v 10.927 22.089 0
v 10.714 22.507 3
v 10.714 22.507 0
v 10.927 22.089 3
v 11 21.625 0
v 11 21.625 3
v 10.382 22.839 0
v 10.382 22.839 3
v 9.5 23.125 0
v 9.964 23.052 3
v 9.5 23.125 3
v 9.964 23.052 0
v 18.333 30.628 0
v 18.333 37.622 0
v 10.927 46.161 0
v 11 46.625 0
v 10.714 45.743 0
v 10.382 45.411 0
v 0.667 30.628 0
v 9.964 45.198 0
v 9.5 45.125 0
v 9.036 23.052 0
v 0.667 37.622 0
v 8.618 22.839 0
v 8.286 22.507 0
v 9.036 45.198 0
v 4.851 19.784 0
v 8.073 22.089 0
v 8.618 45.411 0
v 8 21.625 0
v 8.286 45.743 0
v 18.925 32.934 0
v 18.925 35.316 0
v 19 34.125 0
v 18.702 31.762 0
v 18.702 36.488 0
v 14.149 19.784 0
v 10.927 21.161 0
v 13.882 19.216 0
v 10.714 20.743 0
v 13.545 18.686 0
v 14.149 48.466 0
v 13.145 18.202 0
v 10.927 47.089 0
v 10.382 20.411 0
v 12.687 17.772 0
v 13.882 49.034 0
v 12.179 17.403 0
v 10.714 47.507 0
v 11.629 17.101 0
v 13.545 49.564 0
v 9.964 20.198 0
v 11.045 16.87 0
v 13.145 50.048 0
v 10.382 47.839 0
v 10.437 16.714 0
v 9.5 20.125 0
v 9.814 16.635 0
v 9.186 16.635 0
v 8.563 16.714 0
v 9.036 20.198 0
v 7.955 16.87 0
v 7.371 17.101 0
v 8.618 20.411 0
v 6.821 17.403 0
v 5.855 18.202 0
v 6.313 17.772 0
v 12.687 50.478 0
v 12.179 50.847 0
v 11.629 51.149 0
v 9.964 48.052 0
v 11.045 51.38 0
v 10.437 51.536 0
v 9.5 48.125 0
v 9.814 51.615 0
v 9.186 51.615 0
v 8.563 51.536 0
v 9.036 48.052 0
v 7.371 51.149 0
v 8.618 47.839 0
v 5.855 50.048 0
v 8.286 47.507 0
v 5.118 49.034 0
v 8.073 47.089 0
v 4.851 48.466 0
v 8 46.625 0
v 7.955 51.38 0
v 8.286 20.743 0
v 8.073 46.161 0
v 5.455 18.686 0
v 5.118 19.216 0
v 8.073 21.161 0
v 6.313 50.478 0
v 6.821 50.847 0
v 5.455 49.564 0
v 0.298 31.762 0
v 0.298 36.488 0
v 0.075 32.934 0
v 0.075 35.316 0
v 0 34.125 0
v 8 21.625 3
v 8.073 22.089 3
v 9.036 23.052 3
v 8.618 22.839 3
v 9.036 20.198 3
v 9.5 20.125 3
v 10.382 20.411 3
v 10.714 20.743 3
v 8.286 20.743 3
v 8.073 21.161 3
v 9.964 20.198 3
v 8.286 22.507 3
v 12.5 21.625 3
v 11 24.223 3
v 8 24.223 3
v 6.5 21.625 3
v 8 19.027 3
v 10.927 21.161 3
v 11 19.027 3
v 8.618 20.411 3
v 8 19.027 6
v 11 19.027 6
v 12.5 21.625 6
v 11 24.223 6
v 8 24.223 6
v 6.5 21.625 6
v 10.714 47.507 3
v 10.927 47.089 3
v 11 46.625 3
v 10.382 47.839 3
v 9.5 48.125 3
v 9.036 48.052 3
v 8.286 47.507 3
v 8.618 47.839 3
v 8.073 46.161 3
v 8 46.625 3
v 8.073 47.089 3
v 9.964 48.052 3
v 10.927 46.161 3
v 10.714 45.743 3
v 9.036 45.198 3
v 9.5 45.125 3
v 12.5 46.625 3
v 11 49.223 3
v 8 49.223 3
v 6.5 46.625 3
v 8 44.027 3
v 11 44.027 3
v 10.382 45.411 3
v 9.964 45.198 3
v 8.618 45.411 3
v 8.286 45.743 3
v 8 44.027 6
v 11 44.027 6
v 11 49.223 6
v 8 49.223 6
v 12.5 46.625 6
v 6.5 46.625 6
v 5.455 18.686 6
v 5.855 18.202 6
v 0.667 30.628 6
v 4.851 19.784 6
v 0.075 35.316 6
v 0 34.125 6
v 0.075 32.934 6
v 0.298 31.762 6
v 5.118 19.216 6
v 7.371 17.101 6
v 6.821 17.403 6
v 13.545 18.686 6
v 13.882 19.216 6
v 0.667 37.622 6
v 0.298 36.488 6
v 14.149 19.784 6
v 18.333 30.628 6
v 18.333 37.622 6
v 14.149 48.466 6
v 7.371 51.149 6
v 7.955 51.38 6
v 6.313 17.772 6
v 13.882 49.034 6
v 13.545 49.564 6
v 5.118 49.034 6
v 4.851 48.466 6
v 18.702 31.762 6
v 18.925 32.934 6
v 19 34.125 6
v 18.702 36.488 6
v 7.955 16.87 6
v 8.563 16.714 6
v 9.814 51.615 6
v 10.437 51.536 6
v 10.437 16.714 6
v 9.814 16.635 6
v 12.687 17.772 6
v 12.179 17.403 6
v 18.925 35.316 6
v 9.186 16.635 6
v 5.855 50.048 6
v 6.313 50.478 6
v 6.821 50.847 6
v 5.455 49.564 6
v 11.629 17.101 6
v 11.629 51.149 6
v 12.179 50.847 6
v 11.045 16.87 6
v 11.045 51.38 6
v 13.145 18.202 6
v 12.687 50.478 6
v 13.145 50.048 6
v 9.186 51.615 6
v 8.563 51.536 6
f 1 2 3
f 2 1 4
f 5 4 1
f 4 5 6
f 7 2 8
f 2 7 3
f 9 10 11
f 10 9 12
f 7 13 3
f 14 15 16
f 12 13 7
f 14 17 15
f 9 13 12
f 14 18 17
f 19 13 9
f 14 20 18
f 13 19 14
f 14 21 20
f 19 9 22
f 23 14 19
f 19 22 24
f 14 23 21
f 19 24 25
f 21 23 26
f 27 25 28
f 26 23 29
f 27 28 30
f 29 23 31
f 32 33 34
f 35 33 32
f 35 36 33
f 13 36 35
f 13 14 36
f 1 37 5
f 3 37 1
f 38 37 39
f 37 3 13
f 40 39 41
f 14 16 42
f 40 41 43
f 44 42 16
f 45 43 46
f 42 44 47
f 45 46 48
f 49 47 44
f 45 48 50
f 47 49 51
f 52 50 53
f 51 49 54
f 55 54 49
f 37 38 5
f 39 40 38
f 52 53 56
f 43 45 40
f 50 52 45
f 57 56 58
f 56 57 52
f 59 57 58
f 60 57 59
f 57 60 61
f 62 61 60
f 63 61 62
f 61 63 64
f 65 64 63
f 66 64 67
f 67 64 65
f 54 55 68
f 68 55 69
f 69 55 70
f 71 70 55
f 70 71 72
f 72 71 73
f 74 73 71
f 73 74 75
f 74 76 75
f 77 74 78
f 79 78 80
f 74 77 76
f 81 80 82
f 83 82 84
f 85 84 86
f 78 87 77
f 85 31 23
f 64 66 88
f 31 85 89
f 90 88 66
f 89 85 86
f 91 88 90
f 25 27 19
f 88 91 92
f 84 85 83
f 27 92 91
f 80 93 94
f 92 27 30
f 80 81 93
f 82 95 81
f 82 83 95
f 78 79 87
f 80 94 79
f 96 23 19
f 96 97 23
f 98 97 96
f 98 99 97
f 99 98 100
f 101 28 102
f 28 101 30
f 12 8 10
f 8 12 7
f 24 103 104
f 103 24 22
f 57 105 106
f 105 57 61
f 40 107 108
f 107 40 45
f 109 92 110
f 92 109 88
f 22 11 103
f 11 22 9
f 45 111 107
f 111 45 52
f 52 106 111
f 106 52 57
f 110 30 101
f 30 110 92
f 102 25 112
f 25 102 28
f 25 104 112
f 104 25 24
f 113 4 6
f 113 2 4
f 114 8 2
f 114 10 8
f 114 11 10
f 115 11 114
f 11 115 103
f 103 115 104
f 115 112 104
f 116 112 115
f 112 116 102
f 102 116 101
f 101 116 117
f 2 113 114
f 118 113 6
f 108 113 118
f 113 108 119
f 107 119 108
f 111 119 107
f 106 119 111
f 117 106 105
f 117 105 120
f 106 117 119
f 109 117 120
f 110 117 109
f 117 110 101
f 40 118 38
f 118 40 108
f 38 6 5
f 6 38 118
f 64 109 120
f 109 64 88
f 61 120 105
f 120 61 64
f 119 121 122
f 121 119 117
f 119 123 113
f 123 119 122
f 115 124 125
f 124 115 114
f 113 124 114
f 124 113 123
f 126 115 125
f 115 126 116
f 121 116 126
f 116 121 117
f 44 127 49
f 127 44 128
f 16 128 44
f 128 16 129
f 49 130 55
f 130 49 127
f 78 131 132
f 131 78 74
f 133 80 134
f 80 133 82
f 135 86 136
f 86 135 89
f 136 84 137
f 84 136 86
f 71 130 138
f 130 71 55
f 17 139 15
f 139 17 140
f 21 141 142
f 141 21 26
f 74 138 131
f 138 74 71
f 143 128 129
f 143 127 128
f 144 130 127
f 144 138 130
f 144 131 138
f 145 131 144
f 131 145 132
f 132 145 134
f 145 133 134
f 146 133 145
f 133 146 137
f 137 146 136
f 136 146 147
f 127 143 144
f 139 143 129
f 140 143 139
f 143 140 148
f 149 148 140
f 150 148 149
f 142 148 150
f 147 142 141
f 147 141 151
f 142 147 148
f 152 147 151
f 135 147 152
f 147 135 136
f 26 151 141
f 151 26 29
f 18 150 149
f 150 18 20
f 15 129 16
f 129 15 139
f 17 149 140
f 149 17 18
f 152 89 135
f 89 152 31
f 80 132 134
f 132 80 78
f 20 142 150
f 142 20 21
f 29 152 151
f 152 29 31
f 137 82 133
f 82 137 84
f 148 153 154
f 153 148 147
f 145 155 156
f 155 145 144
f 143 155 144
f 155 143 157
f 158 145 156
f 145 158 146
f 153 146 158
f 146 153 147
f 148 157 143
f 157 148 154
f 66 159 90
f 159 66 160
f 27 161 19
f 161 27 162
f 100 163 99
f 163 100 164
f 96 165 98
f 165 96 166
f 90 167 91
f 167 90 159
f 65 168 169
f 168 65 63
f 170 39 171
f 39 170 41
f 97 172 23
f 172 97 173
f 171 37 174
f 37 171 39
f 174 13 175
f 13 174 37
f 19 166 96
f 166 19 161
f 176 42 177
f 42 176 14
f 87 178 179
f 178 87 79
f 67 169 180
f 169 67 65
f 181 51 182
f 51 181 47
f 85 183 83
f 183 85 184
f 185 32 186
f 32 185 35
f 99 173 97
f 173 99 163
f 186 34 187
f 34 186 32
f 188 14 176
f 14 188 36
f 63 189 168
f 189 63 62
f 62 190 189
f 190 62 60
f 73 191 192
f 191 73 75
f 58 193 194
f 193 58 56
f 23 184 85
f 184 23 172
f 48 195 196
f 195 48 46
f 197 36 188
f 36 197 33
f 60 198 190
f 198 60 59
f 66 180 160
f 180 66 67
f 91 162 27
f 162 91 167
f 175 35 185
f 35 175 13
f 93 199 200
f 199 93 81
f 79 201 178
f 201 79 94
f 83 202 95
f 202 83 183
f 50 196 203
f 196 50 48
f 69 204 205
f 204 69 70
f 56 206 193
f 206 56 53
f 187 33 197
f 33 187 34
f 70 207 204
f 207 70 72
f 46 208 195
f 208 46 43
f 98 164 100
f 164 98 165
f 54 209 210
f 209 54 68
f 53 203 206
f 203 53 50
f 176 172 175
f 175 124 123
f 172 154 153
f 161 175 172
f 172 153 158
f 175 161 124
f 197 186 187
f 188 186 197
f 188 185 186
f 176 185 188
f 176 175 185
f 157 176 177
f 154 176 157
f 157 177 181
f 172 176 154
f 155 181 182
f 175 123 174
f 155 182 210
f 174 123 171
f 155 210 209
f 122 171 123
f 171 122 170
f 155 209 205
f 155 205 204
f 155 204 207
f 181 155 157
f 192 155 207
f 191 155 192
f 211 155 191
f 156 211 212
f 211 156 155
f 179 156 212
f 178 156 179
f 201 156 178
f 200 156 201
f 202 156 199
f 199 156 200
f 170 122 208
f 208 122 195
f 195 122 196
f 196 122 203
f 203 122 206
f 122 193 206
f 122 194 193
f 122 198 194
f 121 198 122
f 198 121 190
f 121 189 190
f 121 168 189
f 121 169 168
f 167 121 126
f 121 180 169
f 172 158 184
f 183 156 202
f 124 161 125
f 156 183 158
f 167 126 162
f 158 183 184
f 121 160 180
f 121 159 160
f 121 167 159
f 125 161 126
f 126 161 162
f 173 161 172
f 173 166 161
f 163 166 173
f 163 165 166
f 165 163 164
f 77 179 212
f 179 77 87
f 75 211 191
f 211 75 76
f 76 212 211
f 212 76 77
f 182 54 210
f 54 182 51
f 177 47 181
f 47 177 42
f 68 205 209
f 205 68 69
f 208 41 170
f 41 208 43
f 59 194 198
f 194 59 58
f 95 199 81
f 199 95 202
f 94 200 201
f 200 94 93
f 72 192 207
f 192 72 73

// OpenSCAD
//Espesor paredes
espesor=3;

//Dimensions Breadboard
XBreadboard=34.5;
YBreadboard=45.5;
ZBreadboard=9;

//Dimensions plataforma base
XBase=XBreadboard*3;
YBase=YBreadboard*1.5;
ZBase=espesor;
radioCirculos=19/2;
radioCirculosPequenosCaster=5;
separacionFuradosCaster=25;

//Dimensions soportes breadboard
XSoportes=XBreadboard+espesor*2;
YSoportes=espesor;
ZSoportes=36;

//Posición Breadboard
xBreadboard=XBase-XBreadboard*1.4;
yBreadboard=(YBase-YBreadboard)/2;
zBreadboard=ZSoportes+espesor-5;

//Dimensións resaltes
XResalte=40;
YResalte=14;
ZResalte=espesor*2;

//facer os furados do motor con oco para a porca OS FURADOS DO SOPORTE SON GRANDES, RADIO 2
module furadosMotor(){
	union(){
	cylinder(r=1.5, h=espesor,$fn=20);
	translate([0,0,espesor])cylinder(r=3,h=espesor*2,$fn=6);
	}
	union(){
	translate ([26,0,0])  cylinder(r=1.5, h=espesor,$fn=20);
	translate([26,0,espesor])cylinder(r=3,h=espesor*2,$fn=6);
	}
	}

module furadosCaster(){
	union(){
	cylinder(r=1.5, h=espesor,$fn=20);
	translate([0,0,espesor])cylinder(r=3,h=espesor*2,$fn=6);
	}
	union(){
	translate ([0,separacionFuradosCaster,0])  cylinder(r=1.5, h=espesor,$fn=20);
	translate([0,separacionFuradosCaster,espesor])cylinder(r=3,h=espesor*2,$fn=6);
	}
	}

module furadosDriver(){

	cylinder(r=1.5, h=espesor,$fn=20);
	translate ([33,0,0])  cylinder(r=1.5, h=espesor,$fn=20);
	translate ([0,29,0])  cylinder(r=1.5, h=espesor,$fn=20);
	translate ([33,29,0])  cylinder(r=1.5, h=espesor,$fn=20);
	}

module furadosPila(){

	cylinder(r=1.5, h=espesor,$fn=20);
	translate ([21,0,0])  cylinder(r=1.5, h=espesor,$fn=20);
	translate ([0,25,0])  cylinder(r=1.5, h=espesor,$fn=20);
	translate ([21,25,0])  cylinder(r=1.5, h=espesor,$fn=20);
	}

module resaltesMotor(){
	cube ([XResalte,YResalte,ZResalte]);
	}

module resalteCaster(){
	hull(){
	cylinder(r=radioCirculos,h=ZResalte,$fn=50);
	translate ([0,separacionFuradosCaster/2,0]) cylinder(r=radioCirculosPequenosCaster,h=ZResalte,$fn=50);
	translate ([0,-separacionFuradosCaster/2,0]) cylinder(r=radioCirculosPequenosCaster,h=ZResalte,$fn=50);
	
	}
	}

module breadboard(){
	cube([XBreadboard,YBreadboard,ZBreadboard]);
	}



//base 
	difference(){
		
			//resaltes Ball Caster
			translate ([radioCirculos,YBase/2,0]) resalteCaster();
			
			
			
		
		
		translate([radioCirculos,YBase/2-separacionFuradosCaster/2,0]) furadosCaster();
		

	}
